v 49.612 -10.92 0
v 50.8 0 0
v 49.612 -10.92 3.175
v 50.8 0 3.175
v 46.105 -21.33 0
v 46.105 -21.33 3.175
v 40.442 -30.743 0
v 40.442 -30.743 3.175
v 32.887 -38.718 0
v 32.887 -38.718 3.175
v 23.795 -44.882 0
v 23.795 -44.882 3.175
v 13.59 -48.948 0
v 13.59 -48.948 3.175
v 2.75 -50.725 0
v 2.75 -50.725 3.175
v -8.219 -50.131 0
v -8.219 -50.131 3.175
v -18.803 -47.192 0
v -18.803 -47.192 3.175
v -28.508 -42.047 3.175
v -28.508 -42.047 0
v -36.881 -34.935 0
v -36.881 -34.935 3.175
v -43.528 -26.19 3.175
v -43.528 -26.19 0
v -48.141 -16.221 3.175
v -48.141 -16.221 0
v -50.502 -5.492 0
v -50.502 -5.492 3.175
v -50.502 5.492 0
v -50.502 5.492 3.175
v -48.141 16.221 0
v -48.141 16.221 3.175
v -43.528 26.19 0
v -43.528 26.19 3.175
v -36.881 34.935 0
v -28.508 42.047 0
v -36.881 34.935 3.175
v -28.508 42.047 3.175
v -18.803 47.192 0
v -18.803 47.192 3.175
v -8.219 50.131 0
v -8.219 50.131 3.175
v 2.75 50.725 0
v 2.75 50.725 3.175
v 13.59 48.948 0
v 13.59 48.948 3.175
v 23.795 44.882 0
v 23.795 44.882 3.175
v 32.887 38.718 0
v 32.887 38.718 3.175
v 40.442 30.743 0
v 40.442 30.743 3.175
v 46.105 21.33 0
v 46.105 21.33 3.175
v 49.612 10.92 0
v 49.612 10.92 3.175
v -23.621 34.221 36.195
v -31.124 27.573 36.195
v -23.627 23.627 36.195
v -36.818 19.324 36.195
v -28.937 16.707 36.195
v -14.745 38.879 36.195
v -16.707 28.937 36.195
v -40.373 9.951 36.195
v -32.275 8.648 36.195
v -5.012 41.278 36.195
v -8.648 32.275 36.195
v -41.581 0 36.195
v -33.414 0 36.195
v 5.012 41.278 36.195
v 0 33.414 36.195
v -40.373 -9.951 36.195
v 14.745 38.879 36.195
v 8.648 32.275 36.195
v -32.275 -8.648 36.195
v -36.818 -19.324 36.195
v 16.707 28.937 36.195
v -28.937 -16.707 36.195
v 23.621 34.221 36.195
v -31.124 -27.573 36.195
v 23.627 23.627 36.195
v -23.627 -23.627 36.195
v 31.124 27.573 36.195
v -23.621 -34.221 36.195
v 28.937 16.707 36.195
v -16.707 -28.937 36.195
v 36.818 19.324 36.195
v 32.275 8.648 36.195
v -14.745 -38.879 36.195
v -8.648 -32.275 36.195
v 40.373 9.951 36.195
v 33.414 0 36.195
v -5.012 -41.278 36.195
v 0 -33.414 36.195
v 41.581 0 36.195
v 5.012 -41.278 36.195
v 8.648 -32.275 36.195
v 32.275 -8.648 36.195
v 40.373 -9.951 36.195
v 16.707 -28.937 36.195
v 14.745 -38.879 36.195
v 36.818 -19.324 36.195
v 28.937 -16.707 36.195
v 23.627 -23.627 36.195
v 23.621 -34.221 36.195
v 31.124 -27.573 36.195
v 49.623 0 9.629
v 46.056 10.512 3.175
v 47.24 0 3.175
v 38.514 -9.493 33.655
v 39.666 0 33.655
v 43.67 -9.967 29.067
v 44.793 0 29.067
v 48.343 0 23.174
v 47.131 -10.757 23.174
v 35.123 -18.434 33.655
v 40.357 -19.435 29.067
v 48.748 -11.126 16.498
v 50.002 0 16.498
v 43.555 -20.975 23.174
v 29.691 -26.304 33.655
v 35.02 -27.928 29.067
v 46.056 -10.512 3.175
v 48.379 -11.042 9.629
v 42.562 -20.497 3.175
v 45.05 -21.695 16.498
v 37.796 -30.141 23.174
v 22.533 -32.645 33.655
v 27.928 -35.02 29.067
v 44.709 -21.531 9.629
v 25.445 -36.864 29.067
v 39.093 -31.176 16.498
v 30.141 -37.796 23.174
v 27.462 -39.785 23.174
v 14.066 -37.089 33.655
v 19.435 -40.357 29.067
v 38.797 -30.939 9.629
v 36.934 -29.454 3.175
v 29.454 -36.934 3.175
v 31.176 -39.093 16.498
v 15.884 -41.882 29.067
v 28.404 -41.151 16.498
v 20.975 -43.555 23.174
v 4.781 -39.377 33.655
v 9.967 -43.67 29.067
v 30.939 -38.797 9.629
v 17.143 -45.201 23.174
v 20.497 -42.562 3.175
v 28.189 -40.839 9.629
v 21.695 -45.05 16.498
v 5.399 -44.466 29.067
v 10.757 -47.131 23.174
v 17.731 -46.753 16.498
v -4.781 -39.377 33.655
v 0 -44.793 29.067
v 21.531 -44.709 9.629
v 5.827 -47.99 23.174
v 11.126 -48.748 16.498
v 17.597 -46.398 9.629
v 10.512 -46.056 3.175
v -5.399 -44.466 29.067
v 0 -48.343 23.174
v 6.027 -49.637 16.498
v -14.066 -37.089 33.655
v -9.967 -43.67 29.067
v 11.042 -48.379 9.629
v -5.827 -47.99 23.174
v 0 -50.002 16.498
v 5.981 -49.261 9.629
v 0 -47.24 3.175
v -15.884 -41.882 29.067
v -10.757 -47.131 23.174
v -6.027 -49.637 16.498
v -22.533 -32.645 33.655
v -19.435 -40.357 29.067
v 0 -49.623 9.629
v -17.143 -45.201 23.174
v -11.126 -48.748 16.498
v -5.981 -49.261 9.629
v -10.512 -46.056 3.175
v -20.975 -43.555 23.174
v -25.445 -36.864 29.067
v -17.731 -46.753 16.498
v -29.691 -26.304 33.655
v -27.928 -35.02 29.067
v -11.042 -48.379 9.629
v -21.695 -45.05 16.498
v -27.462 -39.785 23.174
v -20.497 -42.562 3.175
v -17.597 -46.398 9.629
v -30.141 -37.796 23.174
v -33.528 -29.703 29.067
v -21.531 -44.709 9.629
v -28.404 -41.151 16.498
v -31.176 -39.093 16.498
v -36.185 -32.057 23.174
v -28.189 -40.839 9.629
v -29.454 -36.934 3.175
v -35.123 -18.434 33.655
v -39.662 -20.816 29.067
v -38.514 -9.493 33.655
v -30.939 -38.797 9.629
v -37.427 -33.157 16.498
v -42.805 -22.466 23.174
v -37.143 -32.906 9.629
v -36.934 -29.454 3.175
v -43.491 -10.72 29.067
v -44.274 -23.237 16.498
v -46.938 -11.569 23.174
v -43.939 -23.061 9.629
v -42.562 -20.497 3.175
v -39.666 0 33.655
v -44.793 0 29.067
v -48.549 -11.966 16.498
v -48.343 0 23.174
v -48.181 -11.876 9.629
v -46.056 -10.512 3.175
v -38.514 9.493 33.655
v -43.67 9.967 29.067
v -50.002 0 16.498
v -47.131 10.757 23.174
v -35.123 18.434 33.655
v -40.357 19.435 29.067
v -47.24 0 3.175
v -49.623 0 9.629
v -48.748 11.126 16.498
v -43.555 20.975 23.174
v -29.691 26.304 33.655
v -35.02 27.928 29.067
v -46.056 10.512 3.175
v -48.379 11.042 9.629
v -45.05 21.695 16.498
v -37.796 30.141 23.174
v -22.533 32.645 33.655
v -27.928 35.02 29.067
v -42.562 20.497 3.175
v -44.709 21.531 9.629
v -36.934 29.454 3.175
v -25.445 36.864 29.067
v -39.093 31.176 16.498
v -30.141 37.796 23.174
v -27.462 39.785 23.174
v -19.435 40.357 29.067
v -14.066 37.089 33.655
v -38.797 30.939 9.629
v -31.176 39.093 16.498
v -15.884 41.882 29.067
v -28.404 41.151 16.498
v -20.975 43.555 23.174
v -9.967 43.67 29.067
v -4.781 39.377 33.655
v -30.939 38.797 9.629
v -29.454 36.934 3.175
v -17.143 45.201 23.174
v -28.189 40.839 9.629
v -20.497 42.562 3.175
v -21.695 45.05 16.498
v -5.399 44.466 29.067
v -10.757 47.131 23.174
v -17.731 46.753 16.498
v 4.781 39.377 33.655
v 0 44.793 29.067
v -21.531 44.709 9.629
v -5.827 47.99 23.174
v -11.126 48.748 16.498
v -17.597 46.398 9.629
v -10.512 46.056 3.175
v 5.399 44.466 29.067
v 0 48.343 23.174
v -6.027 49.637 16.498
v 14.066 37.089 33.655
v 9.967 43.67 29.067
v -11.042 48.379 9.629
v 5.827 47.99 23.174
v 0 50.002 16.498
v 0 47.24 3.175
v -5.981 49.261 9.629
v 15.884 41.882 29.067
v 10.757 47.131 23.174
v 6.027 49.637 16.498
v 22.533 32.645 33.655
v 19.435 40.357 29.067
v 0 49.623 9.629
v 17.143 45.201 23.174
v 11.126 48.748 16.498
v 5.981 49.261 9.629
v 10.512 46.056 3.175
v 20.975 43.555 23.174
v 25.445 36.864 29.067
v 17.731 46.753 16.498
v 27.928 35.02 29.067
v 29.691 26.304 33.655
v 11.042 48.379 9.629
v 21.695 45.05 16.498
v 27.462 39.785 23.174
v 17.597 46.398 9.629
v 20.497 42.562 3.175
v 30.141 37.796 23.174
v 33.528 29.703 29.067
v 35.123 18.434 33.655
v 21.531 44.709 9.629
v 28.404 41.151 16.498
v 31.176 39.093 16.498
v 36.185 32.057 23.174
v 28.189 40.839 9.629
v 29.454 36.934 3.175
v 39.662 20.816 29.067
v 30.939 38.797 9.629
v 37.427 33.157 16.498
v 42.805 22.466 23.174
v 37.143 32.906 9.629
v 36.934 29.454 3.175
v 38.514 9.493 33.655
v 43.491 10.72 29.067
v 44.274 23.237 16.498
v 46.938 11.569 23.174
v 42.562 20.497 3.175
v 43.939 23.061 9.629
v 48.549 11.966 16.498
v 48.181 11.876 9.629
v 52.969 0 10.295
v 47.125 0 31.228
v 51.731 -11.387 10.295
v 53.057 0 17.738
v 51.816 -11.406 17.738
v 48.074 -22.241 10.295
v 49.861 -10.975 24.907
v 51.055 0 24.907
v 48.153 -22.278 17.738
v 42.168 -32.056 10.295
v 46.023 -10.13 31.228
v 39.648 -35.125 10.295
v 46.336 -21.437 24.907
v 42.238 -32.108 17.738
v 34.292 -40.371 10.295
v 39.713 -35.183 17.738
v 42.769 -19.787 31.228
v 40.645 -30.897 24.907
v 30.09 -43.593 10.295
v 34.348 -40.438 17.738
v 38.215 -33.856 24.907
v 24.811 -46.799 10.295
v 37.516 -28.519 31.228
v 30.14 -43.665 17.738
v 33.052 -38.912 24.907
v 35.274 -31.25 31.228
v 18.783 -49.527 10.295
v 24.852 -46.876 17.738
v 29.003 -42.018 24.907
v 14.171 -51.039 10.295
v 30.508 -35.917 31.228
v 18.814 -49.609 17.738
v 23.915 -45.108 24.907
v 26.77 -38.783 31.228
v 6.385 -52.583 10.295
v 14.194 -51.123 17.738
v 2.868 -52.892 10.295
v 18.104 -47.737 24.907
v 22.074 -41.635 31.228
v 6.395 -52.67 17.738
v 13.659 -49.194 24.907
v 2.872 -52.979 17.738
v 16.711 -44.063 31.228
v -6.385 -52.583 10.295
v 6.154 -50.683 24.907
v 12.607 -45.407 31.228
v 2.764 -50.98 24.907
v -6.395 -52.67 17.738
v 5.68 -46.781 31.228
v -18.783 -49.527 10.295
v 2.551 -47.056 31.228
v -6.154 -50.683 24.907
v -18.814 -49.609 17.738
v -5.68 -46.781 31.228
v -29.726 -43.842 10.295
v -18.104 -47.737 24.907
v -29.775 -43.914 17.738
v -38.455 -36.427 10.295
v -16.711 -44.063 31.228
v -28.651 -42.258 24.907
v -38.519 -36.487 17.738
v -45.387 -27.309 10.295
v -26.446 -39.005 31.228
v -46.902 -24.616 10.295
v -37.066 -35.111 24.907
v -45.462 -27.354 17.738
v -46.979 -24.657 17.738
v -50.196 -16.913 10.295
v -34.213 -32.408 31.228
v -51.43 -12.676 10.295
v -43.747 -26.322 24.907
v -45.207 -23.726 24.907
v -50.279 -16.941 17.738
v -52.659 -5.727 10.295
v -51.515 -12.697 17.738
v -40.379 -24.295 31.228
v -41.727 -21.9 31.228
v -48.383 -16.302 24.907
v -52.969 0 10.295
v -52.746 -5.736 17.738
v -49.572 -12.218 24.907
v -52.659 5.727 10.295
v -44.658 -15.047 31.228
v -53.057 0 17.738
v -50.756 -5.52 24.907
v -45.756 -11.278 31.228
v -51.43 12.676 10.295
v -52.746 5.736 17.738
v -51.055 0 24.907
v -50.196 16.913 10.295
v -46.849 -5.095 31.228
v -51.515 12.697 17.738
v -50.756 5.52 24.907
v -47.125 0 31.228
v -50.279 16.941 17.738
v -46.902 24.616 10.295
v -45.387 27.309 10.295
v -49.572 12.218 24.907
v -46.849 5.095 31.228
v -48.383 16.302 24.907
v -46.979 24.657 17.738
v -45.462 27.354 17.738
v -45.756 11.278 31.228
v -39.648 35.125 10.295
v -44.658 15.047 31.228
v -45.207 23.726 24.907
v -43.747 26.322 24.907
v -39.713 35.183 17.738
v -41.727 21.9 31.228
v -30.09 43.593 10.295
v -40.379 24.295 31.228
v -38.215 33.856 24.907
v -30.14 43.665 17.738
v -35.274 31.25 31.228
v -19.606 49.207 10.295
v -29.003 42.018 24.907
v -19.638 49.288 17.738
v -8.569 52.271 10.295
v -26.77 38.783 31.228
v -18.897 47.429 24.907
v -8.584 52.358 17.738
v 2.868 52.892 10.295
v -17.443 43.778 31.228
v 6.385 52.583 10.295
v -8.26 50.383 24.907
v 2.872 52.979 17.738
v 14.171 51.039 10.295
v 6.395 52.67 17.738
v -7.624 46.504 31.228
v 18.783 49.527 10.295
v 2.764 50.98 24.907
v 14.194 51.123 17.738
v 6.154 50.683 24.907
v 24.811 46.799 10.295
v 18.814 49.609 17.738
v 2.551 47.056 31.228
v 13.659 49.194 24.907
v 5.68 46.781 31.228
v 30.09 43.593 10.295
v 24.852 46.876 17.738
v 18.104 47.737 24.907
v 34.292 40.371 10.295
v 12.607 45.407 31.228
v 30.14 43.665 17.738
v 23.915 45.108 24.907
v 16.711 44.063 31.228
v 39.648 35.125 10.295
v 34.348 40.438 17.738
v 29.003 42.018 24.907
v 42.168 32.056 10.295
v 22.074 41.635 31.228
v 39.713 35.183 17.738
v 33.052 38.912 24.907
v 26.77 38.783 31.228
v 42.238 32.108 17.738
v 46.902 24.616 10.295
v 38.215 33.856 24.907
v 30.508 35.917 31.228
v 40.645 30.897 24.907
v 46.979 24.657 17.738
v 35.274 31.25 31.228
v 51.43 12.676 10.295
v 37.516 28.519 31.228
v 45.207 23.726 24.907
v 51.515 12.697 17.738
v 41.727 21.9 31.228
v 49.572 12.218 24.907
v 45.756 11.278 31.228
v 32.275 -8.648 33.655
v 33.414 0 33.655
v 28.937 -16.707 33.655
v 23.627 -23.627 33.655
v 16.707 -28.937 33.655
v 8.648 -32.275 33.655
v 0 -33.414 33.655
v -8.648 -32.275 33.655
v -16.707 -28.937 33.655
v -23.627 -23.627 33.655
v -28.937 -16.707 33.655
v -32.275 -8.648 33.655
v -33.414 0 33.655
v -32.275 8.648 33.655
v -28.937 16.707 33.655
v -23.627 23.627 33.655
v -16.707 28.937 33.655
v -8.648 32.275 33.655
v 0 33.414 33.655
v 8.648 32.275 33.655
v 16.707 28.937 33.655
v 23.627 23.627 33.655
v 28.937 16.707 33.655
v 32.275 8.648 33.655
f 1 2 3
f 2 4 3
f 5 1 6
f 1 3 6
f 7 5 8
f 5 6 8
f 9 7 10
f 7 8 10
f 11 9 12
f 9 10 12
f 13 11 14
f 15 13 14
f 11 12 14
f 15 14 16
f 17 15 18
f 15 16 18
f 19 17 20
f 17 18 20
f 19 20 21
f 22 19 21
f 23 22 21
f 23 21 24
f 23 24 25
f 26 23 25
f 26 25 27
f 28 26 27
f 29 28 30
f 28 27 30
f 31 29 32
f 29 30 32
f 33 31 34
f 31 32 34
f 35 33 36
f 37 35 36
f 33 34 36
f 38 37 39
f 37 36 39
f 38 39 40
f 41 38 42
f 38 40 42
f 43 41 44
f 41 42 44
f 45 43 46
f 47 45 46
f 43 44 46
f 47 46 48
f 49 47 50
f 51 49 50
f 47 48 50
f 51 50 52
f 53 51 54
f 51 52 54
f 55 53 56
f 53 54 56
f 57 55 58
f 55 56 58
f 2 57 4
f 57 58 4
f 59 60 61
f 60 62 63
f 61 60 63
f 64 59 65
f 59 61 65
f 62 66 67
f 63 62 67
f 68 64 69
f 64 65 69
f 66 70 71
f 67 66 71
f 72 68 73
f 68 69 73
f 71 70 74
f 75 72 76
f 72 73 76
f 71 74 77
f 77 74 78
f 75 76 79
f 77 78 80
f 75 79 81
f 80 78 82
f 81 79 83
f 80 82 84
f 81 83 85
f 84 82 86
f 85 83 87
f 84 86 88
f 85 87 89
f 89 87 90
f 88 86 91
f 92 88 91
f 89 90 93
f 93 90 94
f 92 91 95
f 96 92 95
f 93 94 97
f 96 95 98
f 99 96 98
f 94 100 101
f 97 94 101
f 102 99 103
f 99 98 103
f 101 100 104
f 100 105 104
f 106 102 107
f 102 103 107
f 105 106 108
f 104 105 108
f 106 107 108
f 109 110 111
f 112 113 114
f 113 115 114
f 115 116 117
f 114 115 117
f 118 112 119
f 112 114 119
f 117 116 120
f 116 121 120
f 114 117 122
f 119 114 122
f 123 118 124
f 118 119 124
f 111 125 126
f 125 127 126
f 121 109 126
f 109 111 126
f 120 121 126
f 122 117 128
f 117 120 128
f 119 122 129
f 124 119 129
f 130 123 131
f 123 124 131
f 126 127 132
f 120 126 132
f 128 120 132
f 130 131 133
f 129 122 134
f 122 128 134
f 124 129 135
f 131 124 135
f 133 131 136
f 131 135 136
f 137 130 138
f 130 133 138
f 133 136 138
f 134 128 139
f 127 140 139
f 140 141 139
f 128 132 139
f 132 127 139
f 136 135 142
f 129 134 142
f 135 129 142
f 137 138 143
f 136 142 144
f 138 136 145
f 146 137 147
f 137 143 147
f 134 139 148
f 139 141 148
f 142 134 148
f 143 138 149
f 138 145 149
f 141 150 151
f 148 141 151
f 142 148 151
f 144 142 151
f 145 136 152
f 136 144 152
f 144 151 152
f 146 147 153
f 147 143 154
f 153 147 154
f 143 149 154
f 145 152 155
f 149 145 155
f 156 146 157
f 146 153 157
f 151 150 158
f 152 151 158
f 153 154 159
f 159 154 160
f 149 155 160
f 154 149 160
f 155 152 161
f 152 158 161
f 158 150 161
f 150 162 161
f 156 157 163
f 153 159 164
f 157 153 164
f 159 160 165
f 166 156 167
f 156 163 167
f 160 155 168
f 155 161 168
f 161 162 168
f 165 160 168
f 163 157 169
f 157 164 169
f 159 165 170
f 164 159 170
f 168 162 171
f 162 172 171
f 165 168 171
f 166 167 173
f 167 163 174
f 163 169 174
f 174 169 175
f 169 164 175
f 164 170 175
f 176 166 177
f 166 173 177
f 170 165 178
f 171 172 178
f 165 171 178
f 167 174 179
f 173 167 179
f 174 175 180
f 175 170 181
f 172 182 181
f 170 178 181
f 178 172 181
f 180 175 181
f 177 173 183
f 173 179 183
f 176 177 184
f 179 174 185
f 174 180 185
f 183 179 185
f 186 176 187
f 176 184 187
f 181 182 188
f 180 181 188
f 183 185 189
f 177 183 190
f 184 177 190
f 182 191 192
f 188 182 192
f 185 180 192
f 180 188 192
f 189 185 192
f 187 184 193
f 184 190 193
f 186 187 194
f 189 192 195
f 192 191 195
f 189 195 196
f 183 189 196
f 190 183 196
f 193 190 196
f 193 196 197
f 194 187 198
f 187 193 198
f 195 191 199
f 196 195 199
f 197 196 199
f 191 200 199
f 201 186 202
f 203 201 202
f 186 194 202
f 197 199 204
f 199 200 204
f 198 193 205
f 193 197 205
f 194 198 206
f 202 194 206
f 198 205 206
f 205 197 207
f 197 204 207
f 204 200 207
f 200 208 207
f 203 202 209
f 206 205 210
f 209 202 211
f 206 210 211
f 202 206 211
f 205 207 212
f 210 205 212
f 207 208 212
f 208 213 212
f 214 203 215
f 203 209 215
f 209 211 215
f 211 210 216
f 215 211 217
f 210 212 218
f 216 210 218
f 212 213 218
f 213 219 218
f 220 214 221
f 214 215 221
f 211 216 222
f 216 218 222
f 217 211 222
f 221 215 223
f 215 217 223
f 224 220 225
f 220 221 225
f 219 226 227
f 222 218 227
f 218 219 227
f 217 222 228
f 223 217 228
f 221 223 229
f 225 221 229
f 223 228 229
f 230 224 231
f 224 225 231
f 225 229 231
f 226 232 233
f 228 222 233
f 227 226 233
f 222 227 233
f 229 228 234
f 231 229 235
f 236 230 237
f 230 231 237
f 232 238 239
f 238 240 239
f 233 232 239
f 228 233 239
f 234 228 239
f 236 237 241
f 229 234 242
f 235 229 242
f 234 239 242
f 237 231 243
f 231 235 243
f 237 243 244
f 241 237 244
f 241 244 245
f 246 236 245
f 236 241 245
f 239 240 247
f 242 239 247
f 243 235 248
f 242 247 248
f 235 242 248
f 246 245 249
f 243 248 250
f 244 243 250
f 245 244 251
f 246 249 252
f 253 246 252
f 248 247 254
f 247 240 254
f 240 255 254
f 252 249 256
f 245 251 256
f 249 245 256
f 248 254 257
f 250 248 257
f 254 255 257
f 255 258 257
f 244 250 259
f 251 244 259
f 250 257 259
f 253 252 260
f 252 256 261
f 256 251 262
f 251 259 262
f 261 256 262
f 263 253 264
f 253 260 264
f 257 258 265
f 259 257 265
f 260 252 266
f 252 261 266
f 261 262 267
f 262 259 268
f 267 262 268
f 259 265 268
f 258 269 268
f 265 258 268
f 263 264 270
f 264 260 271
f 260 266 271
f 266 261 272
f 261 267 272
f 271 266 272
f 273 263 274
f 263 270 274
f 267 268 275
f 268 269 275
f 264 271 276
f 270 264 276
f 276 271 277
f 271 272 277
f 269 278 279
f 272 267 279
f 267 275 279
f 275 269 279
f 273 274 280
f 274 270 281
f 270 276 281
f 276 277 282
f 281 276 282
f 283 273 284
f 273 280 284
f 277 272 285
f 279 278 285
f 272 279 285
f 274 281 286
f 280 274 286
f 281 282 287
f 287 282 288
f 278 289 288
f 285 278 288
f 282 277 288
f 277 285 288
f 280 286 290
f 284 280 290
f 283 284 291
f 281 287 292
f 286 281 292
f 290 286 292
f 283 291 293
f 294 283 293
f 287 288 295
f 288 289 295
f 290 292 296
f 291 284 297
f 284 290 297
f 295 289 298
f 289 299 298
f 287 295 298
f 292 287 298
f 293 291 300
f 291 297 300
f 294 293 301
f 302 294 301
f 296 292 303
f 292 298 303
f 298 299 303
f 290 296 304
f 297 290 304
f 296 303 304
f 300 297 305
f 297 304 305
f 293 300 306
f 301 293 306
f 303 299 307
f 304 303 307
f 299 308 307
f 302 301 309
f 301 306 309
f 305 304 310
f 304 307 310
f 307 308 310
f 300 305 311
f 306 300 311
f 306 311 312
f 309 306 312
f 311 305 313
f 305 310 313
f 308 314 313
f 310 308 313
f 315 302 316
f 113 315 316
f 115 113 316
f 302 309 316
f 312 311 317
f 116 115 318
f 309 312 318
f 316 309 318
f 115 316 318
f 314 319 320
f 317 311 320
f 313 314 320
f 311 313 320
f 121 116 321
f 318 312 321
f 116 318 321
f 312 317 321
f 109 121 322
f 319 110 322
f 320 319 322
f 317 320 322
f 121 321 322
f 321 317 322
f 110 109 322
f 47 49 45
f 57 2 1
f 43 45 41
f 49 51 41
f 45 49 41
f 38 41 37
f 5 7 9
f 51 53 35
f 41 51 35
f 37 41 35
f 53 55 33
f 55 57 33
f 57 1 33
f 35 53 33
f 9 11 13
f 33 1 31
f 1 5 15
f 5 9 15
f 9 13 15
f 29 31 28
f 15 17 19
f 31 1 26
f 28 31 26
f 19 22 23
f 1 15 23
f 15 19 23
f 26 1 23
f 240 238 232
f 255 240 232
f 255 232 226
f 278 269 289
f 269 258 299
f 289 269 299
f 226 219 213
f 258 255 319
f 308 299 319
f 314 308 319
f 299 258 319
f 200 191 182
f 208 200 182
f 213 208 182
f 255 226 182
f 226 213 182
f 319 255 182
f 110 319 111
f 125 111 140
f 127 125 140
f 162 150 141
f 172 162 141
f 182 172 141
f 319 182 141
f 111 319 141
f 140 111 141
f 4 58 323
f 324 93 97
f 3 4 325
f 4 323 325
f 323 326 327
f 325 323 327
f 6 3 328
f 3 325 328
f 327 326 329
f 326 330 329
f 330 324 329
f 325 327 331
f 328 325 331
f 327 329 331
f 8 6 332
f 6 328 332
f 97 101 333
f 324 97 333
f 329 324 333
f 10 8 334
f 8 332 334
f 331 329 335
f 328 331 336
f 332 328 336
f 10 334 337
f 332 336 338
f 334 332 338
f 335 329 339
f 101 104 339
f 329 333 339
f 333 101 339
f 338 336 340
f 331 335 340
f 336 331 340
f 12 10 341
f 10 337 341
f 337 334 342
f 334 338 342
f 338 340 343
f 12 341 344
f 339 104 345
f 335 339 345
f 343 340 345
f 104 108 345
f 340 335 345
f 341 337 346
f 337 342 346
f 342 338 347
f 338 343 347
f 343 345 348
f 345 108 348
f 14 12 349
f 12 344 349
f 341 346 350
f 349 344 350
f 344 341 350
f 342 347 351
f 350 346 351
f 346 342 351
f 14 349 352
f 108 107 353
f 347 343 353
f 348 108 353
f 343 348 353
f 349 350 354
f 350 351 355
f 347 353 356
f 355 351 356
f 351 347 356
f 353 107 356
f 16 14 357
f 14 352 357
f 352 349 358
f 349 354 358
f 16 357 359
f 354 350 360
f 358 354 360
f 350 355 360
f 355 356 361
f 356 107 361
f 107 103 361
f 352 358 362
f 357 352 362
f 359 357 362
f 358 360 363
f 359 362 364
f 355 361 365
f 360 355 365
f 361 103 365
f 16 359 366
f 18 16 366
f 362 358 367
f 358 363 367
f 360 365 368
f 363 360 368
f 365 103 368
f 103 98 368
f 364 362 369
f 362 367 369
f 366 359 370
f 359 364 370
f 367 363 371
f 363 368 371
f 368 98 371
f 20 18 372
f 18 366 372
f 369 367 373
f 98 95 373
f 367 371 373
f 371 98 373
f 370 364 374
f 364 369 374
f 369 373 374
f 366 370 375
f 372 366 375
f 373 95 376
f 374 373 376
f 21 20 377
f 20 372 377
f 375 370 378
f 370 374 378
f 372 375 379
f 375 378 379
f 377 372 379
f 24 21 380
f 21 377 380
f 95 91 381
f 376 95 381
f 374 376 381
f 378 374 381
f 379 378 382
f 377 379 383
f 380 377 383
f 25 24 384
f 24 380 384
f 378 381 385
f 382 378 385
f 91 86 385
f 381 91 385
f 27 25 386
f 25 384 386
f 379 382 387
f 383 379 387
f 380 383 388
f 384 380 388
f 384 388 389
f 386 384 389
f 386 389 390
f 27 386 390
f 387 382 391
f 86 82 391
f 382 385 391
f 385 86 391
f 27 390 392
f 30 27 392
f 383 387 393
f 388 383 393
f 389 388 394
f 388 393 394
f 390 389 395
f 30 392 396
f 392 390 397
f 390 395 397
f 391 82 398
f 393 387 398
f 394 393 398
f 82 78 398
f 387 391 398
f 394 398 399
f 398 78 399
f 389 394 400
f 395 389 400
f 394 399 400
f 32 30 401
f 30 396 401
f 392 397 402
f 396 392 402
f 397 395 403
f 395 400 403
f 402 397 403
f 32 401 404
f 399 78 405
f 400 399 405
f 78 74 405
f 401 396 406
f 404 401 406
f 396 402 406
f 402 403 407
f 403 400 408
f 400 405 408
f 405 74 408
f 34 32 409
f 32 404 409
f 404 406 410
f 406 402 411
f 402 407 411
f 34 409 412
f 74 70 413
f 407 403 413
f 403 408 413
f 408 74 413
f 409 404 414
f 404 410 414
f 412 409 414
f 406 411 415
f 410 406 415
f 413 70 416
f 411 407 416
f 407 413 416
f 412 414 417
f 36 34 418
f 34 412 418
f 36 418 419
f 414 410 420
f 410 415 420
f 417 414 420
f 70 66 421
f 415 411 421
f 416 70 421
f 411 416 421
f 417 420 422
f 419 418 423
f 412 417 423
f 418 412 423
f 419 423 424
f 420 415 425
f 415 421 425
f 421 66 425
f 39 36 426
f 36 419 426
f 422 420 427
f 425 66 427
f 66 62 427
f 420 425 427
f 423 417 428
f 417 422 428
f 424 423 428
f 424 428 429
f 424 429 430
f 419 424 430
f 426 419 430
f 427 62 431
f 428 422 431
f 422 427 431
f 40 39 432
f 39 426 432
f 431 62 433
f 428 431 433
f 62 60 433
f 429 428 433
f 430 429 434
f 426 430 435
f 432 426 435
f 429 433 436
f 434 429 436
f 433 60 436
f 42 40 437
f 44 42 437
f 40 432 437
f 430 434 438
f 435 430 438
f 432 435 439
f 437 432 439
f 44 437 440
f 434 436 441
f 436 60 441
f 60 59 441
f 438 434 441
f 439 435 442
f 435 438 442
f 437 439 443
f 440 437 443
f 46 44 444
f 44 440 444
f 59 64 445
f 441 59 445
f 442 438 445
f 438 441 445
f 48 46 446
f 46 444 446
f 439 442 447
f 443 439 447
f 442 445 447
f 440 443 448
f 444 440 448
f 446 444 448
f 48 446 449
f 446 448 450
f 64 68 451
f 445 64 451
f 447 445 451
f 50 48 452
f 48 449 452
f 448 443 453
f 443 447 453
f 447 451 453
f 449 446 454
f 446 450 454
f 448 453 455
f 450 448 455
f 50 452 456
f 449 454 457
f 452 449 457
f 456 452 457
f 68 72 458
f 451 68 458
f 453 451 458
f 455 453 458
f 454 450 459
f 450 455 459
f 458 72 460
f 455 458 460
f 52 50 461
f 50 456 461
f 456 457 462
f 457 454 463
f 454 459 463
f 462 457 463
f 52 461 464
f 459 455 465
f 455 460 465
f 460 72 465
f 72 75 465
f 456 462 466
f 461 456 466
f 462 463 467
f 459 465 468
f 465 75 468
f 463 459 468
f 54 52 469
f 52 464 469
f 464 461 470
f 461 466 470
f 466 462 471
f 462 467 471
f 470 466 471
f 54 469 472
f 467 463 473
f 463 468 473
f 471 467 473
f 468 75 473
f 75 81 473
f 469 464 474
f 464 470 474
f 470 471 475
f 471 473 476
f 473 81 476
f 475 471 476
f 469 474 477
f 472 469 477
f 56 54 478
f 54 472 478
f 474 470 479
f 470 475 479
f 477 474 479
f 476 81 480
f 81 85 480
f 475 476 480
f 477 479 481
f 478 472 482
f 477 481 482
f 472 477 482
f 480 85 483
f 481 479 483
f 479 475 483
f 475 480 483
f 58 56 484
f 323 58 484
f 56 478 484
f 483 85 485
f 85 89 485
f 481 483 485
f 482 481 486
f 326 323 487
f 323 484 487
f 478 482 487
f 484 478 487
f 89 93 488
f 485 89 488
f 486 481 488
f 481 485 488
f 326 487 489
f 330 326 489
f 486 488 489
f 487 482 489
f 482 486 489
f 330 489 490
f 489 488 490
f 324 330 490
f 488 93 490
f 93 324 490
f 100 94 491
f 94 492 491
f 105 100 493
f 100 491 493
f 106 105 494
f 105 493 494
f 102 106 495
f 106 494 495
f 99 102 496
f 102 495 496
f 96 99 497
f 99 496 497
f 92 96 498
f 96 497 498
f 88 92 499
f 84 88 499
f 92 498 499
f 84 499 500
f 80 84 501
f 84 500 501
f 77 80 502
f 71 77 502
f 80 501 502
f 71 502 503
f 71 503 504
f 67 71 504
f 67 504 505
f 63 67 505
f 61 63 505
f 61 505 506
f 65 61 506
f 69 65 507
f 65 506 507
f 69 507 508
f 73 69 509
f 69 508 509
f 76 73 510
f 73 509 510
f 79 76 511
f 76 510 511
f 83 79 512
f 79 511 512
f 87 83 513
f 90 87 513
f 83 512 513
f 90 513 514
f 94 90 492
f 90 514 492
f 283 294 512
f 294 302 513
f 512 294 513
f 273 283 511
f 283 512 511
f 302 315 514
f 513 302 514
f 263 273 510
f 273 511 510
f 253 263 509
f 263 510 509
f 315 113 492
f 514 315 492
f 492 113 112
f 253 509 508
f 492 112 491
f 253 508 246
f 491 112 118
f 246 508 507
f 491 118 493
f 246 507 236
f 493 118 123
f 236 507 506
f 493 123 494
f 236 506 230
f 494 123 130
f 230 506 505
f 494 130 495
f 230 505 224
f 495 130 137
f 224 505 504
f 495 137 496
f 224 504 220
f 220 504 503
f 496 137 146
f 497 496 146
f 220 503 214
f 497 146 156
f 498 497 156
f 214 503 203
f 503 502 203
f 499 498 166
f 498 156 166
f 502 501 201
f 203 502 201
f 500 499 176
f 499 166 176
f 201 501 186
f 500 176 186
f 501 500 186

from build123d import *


with BuildPart() as f1:
    # F0 (on Front) → F1 (revolve)
    with BuildSketch(Plane.XZ):
        Polygon((0, 3.175), (0, 0), (50.8, 0), (50.8, 3.175), (47.240072, 3.175), align=None)
        with BuildLine():
            Line((47.240072, 3.175), (50.8, 3.175))
            ThreePointArc((50.8, 3.175), (52.31077, 21.393685), (41.581185, 36.195))
            Line((41.581185, 36.195), (39.666256, 33.655))
            ThreePointArc((39.666256, 33.655), (49.421995, 19.898164), (47.240072, 3.175))
        make_face()
        Polygon((39.666256, 33.655), (41.581185, 36.195), (33.413851, 36.195), (33.413851, 33.655), align=None)
    revolve(axis=Axis((0, 0, 4.551888), (0, 0, -1)))


solid = f1.part
